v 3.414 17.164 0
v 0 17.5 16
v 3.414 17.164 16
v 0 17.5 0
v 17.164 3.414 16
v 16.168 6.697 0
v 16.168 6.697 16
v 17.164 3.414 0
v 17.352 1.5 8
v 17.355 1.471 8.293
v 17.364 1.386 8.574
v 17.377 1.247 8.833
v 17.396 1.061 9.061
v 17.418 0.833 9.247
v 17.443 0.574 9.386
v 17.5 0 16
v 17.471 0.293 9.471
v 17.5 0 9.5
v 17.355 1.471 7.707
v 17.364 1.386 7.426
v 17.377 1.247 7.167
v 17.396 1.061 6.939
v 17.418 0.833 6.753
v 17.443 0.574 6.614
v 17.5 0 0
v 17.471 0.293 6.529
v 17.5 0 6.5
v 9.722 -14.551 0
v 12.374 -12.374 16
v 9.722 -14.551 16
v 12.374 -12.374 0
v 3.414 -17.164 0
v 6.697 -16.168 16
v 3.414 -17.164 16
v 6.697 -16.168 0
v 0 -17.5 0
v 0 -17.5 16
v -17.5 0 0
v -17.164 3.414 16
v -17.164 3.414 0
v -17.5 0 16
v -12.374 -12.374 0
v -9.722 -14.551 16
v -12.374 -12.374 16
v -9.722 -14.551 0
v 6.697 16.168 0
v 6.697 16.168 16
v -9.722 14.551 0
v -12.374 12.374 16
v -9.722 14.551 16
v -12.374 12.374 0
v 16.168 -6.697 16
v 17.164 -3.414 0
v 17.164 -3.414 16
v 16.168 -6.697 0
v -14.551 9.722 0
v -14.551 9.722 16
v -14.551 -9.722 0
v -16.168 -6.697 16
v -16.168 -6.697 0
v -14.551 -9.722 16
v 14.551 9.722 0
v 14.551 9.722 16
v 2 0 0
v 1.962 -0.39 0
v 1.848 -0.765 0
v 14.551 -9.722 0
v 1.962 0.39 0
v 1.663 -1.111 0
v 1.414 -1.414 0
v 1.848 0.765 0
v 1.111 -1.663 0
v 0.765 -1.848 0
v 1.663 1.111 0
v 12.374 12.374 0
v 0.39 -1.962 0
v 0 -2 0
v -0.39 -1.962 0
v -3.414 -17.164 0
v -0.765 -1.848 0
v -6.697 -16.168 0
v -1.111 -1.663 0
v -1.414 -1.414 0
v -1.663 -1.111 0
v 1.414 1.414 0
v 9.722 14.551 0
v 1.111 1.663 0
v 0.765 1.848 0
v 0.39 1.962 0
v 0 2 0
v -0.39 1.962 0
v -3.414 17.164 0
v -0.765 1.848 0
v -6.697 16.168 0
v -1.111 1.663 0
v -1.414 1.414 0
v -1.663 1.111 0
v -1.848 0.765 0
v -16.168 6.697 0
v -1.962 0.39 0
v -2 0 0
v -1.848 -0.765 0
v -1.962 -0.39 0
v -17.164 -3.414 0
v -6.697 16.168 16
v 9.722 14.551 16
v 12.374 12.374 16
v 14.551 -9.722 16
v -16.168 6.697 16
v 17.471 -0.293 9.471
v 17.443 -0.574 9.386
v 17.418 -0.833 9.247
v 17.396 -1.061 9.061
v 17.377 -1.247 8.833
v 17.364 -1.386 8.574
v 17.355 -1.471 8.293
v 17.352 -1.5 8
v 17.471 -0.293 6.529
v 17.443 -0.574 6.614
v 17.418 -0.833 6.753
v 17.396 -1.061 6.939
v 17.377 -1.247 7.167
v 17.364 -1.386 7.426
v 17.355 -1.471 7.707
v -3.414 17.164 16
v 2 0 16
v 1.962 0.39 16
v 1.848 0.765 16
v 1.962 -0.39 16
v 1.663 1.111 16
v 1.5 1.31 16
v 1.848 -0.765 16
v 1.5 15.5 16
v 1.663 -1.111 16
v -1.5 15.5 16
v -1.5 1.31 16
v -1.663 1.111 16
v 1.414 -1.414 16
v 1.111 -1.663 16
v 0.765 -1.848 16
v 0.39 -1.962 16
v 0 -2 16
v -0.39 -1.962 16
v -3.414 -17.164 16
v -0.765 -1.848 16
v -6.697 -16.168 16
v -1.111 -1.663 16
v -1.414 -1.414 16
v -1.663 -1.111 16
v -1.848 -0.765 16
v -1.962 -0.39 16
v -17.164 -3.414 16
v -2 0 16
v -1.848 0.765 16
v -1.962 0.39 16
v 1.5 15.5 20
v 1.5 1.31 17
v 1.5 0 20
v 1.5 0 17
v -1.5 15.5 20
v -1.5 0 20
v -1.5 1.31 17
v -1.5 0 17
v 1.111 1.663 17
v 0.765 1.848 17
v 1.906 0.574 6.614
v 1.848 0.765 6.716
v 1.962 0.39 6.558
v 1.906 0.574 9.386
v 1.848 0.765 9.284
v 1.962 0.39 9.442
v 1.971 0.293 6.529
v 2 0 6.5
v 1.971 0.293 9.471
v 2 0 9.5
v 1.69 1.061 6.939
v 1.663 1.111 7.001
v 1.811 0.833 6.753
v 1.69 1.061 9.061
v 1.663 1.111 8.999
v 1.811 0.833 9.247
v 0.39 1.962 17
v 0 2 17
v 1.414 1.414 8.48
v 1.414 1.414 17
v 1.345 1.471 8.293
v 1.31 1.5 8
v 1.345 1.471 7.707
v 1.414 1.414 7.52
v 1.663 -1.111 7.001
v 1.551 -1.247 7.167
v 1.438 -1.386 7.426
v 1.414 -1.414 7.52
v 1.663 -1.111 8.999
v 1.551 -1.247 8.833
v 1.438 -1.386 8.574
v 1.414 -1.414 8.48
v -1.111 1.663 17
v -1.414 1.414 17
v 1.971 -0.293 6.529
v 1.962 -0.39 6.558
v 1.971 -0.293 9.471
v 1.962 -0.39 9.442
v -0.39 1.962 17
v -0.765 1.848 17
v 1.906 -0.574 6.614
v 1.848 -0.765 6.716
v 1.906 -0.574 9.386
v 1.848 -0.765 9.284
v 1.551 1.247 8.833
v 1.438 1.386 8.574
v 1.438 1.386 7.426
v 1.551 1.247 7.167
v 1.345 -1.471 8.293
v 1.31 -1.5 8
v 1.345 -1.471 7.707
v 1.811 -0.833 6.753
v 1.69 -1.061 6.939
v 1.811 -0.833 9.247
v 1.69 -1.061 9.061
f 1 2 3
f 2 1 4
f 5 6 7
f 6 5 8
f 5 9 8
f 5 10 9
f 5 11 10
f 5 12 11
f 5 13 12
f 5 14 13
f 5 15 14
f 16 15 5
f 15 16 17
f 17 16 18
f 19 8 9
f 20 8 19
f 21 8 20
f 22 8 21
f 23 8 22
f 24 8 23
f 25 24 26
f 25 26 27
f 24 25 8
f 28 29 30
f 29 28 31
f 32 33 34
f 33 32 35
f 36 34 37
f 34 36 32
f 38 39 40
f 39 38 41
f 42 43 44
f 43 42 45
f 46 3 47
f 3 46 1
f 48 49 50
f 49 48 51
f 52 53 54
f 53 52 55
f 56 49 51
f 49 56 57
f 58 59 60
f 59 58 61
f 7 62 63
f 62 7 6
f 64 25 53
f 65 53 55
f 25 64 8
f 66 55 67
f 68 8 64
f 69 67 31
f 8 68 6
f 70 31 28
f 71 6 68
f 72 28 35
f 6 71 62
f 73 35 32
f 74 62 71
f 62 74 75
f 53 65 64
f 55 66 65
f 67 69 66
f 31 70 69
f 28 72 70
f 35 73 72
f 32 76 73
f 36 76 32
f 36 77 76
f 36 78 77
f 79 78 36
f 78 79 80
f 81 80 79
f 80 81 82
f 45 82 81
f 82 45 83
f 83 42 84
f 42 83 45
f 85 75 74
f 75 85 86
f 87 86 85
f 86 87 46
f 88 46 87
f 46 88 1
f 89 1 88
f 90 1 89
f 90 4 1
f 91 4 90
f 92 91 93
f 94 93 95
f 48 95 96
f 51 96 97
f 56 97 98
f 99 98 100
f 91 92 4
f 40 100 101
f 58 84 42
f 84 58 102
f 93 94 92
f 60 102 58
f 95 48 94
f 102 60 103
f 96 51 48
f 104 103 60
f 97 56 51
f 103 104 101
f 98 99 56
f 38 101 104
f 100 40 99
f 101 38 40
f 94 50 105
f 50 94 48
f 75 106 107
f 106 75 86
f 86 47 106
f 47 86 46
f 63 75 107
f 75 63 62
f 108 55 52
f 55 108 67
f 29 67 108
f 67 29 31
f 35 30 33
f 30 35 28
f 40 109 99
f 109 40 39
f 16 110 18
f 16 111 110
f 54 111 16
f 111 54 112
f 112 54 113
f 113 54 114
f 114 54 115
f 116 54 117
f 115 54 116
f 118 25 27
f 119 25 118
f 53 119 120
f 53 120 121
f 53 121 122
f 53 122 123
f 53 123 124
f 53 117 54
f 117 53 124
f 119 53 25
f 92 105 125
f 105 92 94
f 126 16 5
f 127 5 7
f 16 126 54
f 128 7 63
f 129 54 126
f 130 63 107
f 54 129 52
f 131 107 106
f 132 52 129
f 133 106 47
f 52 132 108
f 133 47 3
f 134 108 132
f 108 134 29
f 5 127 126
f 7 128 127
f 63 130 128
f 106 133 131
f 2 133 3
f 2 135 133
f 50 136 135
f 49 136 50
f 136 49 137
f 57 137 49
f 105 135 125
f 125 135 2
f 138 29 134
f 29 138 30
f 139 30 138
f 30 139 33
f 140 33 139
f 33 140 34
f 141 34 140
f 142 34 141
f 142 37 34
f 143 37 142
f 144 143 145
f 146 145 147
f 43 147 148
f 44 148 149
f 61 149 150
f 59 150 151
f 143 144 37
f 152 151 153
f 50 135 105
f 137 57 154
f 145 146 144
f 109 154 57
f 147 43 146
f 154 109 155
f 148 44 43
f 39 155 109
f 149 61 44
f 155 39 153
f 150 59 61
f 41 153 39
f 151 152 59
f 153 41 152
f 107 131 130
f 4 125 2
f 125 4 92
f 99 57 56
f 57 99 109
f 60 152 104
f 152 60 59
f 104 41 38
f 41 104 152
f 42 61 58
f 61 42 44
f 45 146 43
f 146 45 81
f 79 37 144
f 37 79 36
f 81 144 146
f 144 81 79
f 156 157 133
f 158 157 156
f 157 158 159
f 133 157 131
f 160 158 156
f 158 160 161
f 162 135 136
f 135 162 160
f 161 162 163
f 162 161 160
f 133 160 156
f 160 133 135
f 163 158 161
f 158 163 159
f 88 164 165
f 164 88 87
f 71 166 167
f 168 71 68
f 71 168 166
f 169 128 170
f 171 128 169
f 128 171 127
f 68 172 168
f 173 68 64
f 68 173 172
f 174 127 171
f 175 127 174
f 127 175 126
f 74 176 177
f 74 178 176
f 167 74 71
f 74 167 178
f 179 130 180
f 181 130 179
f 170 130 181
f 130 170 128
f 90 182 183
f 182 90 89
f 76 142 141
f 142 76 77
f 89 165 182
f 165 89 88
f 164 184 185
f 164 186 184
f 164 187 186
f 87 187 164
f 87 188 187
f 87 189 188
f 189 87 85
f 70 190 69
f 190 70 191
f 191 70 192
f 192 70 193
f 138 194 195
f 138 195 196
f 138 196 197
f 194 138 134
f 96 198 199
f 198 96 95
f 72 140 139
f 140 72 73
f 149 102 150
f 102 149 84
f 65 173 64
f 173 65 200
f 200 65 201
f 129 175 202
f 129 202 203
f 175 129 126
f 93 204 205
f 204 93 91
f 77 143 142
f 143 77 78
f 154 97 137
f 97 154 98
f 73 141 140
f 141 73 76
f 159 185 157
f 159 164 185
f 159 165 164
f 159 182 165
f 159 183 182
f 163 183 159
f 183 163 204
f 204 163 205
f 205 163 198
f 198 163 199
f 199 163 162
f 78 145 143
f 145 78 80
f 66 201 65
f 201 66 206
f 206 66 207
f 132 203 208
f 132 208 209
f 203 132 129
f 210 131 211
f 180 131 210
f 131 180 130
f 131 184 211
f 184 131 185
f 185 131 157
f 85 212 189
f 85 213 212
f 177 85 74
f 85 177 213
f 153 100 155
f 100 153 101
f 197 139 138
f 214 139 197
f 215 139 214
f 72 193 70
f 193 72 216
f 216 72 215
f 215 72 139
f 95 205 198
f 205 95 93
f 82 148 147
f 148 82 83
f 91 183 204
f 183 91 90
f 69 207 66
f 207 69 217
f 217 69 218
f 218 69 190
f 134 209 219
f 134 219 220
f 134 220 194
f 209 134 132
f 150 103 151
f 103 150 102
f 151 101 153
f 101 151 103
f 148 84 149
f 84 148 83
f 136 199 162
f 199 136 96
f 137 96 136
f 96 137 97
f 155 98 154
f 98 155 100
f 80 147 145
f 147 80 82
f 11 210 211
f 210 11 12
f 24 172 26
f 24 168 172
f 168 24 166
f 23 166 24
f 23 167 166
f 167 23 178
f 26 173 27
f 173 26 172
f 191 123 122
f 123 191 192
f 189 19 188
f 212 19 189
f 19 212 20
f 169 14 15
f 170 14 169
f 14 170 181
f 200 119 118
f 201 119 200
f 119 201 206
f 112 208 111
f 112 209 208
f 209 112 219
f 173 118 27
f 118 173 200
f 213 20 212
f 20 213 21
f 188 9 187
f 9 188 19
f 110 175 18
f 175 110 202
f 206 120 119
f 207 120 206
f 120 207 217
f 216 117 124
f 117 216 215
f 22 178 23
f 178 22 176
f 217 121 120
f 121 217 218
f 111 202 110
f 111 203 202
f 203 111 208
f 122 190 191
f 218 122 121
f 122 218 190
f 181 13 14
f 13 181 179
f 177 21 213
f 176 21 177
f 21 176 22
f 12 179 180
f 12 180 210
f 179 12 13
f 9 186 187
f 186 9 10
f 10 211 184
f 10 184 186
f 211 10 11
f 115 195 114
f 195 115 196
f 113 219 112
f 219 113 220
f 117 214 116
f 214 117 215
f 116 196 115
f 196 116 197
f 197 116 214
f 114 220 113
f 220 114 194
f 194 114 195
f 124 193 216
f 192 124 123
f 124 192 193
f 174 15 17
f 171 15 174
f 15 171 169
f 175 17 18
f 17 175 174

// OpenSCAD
$fn = 32;

// ----------------------------------------------------------------------
// Control knob: pointer knob
// ----------------------------------------------------------------------

// --- parameters (mm) ---
rib_w = 3;                // pointer rib width
rib_h = 5;                // pointer rib height
knob_d = 35;              // knob body diameter
knob_h = 16;              // knob body height
bore_d = 4;               // shaft bore diameter
set_d = 3;                // set screw bore diameter
fit_tol = 0.1;            // tolerance for press fits, mm
free_tol = 0.3;           // tolerance for clearance fits, mm

rib_poke = rib_h - 1;  // rib height above the top
total_h = knob_h + rib_h - 1;  // overall height

difference() {
  union() {
    cylinder(h = knob_h, d = knob_d);
    translate([-rib_w / 2, 0, knob_h - 1])
      cube([rib_w, knob_d / 2 - 2, rib_h]);
  }
  translate([0, 0, -1]) cylinder(h = knob_h + 2, d = bore_d);
  translate([-1, 0, knob_h / 2]) rotate([0, 90, 0])
    cylinder(h = knob_d / 2 + bore_d / 2 + 2, d = set_d);}
